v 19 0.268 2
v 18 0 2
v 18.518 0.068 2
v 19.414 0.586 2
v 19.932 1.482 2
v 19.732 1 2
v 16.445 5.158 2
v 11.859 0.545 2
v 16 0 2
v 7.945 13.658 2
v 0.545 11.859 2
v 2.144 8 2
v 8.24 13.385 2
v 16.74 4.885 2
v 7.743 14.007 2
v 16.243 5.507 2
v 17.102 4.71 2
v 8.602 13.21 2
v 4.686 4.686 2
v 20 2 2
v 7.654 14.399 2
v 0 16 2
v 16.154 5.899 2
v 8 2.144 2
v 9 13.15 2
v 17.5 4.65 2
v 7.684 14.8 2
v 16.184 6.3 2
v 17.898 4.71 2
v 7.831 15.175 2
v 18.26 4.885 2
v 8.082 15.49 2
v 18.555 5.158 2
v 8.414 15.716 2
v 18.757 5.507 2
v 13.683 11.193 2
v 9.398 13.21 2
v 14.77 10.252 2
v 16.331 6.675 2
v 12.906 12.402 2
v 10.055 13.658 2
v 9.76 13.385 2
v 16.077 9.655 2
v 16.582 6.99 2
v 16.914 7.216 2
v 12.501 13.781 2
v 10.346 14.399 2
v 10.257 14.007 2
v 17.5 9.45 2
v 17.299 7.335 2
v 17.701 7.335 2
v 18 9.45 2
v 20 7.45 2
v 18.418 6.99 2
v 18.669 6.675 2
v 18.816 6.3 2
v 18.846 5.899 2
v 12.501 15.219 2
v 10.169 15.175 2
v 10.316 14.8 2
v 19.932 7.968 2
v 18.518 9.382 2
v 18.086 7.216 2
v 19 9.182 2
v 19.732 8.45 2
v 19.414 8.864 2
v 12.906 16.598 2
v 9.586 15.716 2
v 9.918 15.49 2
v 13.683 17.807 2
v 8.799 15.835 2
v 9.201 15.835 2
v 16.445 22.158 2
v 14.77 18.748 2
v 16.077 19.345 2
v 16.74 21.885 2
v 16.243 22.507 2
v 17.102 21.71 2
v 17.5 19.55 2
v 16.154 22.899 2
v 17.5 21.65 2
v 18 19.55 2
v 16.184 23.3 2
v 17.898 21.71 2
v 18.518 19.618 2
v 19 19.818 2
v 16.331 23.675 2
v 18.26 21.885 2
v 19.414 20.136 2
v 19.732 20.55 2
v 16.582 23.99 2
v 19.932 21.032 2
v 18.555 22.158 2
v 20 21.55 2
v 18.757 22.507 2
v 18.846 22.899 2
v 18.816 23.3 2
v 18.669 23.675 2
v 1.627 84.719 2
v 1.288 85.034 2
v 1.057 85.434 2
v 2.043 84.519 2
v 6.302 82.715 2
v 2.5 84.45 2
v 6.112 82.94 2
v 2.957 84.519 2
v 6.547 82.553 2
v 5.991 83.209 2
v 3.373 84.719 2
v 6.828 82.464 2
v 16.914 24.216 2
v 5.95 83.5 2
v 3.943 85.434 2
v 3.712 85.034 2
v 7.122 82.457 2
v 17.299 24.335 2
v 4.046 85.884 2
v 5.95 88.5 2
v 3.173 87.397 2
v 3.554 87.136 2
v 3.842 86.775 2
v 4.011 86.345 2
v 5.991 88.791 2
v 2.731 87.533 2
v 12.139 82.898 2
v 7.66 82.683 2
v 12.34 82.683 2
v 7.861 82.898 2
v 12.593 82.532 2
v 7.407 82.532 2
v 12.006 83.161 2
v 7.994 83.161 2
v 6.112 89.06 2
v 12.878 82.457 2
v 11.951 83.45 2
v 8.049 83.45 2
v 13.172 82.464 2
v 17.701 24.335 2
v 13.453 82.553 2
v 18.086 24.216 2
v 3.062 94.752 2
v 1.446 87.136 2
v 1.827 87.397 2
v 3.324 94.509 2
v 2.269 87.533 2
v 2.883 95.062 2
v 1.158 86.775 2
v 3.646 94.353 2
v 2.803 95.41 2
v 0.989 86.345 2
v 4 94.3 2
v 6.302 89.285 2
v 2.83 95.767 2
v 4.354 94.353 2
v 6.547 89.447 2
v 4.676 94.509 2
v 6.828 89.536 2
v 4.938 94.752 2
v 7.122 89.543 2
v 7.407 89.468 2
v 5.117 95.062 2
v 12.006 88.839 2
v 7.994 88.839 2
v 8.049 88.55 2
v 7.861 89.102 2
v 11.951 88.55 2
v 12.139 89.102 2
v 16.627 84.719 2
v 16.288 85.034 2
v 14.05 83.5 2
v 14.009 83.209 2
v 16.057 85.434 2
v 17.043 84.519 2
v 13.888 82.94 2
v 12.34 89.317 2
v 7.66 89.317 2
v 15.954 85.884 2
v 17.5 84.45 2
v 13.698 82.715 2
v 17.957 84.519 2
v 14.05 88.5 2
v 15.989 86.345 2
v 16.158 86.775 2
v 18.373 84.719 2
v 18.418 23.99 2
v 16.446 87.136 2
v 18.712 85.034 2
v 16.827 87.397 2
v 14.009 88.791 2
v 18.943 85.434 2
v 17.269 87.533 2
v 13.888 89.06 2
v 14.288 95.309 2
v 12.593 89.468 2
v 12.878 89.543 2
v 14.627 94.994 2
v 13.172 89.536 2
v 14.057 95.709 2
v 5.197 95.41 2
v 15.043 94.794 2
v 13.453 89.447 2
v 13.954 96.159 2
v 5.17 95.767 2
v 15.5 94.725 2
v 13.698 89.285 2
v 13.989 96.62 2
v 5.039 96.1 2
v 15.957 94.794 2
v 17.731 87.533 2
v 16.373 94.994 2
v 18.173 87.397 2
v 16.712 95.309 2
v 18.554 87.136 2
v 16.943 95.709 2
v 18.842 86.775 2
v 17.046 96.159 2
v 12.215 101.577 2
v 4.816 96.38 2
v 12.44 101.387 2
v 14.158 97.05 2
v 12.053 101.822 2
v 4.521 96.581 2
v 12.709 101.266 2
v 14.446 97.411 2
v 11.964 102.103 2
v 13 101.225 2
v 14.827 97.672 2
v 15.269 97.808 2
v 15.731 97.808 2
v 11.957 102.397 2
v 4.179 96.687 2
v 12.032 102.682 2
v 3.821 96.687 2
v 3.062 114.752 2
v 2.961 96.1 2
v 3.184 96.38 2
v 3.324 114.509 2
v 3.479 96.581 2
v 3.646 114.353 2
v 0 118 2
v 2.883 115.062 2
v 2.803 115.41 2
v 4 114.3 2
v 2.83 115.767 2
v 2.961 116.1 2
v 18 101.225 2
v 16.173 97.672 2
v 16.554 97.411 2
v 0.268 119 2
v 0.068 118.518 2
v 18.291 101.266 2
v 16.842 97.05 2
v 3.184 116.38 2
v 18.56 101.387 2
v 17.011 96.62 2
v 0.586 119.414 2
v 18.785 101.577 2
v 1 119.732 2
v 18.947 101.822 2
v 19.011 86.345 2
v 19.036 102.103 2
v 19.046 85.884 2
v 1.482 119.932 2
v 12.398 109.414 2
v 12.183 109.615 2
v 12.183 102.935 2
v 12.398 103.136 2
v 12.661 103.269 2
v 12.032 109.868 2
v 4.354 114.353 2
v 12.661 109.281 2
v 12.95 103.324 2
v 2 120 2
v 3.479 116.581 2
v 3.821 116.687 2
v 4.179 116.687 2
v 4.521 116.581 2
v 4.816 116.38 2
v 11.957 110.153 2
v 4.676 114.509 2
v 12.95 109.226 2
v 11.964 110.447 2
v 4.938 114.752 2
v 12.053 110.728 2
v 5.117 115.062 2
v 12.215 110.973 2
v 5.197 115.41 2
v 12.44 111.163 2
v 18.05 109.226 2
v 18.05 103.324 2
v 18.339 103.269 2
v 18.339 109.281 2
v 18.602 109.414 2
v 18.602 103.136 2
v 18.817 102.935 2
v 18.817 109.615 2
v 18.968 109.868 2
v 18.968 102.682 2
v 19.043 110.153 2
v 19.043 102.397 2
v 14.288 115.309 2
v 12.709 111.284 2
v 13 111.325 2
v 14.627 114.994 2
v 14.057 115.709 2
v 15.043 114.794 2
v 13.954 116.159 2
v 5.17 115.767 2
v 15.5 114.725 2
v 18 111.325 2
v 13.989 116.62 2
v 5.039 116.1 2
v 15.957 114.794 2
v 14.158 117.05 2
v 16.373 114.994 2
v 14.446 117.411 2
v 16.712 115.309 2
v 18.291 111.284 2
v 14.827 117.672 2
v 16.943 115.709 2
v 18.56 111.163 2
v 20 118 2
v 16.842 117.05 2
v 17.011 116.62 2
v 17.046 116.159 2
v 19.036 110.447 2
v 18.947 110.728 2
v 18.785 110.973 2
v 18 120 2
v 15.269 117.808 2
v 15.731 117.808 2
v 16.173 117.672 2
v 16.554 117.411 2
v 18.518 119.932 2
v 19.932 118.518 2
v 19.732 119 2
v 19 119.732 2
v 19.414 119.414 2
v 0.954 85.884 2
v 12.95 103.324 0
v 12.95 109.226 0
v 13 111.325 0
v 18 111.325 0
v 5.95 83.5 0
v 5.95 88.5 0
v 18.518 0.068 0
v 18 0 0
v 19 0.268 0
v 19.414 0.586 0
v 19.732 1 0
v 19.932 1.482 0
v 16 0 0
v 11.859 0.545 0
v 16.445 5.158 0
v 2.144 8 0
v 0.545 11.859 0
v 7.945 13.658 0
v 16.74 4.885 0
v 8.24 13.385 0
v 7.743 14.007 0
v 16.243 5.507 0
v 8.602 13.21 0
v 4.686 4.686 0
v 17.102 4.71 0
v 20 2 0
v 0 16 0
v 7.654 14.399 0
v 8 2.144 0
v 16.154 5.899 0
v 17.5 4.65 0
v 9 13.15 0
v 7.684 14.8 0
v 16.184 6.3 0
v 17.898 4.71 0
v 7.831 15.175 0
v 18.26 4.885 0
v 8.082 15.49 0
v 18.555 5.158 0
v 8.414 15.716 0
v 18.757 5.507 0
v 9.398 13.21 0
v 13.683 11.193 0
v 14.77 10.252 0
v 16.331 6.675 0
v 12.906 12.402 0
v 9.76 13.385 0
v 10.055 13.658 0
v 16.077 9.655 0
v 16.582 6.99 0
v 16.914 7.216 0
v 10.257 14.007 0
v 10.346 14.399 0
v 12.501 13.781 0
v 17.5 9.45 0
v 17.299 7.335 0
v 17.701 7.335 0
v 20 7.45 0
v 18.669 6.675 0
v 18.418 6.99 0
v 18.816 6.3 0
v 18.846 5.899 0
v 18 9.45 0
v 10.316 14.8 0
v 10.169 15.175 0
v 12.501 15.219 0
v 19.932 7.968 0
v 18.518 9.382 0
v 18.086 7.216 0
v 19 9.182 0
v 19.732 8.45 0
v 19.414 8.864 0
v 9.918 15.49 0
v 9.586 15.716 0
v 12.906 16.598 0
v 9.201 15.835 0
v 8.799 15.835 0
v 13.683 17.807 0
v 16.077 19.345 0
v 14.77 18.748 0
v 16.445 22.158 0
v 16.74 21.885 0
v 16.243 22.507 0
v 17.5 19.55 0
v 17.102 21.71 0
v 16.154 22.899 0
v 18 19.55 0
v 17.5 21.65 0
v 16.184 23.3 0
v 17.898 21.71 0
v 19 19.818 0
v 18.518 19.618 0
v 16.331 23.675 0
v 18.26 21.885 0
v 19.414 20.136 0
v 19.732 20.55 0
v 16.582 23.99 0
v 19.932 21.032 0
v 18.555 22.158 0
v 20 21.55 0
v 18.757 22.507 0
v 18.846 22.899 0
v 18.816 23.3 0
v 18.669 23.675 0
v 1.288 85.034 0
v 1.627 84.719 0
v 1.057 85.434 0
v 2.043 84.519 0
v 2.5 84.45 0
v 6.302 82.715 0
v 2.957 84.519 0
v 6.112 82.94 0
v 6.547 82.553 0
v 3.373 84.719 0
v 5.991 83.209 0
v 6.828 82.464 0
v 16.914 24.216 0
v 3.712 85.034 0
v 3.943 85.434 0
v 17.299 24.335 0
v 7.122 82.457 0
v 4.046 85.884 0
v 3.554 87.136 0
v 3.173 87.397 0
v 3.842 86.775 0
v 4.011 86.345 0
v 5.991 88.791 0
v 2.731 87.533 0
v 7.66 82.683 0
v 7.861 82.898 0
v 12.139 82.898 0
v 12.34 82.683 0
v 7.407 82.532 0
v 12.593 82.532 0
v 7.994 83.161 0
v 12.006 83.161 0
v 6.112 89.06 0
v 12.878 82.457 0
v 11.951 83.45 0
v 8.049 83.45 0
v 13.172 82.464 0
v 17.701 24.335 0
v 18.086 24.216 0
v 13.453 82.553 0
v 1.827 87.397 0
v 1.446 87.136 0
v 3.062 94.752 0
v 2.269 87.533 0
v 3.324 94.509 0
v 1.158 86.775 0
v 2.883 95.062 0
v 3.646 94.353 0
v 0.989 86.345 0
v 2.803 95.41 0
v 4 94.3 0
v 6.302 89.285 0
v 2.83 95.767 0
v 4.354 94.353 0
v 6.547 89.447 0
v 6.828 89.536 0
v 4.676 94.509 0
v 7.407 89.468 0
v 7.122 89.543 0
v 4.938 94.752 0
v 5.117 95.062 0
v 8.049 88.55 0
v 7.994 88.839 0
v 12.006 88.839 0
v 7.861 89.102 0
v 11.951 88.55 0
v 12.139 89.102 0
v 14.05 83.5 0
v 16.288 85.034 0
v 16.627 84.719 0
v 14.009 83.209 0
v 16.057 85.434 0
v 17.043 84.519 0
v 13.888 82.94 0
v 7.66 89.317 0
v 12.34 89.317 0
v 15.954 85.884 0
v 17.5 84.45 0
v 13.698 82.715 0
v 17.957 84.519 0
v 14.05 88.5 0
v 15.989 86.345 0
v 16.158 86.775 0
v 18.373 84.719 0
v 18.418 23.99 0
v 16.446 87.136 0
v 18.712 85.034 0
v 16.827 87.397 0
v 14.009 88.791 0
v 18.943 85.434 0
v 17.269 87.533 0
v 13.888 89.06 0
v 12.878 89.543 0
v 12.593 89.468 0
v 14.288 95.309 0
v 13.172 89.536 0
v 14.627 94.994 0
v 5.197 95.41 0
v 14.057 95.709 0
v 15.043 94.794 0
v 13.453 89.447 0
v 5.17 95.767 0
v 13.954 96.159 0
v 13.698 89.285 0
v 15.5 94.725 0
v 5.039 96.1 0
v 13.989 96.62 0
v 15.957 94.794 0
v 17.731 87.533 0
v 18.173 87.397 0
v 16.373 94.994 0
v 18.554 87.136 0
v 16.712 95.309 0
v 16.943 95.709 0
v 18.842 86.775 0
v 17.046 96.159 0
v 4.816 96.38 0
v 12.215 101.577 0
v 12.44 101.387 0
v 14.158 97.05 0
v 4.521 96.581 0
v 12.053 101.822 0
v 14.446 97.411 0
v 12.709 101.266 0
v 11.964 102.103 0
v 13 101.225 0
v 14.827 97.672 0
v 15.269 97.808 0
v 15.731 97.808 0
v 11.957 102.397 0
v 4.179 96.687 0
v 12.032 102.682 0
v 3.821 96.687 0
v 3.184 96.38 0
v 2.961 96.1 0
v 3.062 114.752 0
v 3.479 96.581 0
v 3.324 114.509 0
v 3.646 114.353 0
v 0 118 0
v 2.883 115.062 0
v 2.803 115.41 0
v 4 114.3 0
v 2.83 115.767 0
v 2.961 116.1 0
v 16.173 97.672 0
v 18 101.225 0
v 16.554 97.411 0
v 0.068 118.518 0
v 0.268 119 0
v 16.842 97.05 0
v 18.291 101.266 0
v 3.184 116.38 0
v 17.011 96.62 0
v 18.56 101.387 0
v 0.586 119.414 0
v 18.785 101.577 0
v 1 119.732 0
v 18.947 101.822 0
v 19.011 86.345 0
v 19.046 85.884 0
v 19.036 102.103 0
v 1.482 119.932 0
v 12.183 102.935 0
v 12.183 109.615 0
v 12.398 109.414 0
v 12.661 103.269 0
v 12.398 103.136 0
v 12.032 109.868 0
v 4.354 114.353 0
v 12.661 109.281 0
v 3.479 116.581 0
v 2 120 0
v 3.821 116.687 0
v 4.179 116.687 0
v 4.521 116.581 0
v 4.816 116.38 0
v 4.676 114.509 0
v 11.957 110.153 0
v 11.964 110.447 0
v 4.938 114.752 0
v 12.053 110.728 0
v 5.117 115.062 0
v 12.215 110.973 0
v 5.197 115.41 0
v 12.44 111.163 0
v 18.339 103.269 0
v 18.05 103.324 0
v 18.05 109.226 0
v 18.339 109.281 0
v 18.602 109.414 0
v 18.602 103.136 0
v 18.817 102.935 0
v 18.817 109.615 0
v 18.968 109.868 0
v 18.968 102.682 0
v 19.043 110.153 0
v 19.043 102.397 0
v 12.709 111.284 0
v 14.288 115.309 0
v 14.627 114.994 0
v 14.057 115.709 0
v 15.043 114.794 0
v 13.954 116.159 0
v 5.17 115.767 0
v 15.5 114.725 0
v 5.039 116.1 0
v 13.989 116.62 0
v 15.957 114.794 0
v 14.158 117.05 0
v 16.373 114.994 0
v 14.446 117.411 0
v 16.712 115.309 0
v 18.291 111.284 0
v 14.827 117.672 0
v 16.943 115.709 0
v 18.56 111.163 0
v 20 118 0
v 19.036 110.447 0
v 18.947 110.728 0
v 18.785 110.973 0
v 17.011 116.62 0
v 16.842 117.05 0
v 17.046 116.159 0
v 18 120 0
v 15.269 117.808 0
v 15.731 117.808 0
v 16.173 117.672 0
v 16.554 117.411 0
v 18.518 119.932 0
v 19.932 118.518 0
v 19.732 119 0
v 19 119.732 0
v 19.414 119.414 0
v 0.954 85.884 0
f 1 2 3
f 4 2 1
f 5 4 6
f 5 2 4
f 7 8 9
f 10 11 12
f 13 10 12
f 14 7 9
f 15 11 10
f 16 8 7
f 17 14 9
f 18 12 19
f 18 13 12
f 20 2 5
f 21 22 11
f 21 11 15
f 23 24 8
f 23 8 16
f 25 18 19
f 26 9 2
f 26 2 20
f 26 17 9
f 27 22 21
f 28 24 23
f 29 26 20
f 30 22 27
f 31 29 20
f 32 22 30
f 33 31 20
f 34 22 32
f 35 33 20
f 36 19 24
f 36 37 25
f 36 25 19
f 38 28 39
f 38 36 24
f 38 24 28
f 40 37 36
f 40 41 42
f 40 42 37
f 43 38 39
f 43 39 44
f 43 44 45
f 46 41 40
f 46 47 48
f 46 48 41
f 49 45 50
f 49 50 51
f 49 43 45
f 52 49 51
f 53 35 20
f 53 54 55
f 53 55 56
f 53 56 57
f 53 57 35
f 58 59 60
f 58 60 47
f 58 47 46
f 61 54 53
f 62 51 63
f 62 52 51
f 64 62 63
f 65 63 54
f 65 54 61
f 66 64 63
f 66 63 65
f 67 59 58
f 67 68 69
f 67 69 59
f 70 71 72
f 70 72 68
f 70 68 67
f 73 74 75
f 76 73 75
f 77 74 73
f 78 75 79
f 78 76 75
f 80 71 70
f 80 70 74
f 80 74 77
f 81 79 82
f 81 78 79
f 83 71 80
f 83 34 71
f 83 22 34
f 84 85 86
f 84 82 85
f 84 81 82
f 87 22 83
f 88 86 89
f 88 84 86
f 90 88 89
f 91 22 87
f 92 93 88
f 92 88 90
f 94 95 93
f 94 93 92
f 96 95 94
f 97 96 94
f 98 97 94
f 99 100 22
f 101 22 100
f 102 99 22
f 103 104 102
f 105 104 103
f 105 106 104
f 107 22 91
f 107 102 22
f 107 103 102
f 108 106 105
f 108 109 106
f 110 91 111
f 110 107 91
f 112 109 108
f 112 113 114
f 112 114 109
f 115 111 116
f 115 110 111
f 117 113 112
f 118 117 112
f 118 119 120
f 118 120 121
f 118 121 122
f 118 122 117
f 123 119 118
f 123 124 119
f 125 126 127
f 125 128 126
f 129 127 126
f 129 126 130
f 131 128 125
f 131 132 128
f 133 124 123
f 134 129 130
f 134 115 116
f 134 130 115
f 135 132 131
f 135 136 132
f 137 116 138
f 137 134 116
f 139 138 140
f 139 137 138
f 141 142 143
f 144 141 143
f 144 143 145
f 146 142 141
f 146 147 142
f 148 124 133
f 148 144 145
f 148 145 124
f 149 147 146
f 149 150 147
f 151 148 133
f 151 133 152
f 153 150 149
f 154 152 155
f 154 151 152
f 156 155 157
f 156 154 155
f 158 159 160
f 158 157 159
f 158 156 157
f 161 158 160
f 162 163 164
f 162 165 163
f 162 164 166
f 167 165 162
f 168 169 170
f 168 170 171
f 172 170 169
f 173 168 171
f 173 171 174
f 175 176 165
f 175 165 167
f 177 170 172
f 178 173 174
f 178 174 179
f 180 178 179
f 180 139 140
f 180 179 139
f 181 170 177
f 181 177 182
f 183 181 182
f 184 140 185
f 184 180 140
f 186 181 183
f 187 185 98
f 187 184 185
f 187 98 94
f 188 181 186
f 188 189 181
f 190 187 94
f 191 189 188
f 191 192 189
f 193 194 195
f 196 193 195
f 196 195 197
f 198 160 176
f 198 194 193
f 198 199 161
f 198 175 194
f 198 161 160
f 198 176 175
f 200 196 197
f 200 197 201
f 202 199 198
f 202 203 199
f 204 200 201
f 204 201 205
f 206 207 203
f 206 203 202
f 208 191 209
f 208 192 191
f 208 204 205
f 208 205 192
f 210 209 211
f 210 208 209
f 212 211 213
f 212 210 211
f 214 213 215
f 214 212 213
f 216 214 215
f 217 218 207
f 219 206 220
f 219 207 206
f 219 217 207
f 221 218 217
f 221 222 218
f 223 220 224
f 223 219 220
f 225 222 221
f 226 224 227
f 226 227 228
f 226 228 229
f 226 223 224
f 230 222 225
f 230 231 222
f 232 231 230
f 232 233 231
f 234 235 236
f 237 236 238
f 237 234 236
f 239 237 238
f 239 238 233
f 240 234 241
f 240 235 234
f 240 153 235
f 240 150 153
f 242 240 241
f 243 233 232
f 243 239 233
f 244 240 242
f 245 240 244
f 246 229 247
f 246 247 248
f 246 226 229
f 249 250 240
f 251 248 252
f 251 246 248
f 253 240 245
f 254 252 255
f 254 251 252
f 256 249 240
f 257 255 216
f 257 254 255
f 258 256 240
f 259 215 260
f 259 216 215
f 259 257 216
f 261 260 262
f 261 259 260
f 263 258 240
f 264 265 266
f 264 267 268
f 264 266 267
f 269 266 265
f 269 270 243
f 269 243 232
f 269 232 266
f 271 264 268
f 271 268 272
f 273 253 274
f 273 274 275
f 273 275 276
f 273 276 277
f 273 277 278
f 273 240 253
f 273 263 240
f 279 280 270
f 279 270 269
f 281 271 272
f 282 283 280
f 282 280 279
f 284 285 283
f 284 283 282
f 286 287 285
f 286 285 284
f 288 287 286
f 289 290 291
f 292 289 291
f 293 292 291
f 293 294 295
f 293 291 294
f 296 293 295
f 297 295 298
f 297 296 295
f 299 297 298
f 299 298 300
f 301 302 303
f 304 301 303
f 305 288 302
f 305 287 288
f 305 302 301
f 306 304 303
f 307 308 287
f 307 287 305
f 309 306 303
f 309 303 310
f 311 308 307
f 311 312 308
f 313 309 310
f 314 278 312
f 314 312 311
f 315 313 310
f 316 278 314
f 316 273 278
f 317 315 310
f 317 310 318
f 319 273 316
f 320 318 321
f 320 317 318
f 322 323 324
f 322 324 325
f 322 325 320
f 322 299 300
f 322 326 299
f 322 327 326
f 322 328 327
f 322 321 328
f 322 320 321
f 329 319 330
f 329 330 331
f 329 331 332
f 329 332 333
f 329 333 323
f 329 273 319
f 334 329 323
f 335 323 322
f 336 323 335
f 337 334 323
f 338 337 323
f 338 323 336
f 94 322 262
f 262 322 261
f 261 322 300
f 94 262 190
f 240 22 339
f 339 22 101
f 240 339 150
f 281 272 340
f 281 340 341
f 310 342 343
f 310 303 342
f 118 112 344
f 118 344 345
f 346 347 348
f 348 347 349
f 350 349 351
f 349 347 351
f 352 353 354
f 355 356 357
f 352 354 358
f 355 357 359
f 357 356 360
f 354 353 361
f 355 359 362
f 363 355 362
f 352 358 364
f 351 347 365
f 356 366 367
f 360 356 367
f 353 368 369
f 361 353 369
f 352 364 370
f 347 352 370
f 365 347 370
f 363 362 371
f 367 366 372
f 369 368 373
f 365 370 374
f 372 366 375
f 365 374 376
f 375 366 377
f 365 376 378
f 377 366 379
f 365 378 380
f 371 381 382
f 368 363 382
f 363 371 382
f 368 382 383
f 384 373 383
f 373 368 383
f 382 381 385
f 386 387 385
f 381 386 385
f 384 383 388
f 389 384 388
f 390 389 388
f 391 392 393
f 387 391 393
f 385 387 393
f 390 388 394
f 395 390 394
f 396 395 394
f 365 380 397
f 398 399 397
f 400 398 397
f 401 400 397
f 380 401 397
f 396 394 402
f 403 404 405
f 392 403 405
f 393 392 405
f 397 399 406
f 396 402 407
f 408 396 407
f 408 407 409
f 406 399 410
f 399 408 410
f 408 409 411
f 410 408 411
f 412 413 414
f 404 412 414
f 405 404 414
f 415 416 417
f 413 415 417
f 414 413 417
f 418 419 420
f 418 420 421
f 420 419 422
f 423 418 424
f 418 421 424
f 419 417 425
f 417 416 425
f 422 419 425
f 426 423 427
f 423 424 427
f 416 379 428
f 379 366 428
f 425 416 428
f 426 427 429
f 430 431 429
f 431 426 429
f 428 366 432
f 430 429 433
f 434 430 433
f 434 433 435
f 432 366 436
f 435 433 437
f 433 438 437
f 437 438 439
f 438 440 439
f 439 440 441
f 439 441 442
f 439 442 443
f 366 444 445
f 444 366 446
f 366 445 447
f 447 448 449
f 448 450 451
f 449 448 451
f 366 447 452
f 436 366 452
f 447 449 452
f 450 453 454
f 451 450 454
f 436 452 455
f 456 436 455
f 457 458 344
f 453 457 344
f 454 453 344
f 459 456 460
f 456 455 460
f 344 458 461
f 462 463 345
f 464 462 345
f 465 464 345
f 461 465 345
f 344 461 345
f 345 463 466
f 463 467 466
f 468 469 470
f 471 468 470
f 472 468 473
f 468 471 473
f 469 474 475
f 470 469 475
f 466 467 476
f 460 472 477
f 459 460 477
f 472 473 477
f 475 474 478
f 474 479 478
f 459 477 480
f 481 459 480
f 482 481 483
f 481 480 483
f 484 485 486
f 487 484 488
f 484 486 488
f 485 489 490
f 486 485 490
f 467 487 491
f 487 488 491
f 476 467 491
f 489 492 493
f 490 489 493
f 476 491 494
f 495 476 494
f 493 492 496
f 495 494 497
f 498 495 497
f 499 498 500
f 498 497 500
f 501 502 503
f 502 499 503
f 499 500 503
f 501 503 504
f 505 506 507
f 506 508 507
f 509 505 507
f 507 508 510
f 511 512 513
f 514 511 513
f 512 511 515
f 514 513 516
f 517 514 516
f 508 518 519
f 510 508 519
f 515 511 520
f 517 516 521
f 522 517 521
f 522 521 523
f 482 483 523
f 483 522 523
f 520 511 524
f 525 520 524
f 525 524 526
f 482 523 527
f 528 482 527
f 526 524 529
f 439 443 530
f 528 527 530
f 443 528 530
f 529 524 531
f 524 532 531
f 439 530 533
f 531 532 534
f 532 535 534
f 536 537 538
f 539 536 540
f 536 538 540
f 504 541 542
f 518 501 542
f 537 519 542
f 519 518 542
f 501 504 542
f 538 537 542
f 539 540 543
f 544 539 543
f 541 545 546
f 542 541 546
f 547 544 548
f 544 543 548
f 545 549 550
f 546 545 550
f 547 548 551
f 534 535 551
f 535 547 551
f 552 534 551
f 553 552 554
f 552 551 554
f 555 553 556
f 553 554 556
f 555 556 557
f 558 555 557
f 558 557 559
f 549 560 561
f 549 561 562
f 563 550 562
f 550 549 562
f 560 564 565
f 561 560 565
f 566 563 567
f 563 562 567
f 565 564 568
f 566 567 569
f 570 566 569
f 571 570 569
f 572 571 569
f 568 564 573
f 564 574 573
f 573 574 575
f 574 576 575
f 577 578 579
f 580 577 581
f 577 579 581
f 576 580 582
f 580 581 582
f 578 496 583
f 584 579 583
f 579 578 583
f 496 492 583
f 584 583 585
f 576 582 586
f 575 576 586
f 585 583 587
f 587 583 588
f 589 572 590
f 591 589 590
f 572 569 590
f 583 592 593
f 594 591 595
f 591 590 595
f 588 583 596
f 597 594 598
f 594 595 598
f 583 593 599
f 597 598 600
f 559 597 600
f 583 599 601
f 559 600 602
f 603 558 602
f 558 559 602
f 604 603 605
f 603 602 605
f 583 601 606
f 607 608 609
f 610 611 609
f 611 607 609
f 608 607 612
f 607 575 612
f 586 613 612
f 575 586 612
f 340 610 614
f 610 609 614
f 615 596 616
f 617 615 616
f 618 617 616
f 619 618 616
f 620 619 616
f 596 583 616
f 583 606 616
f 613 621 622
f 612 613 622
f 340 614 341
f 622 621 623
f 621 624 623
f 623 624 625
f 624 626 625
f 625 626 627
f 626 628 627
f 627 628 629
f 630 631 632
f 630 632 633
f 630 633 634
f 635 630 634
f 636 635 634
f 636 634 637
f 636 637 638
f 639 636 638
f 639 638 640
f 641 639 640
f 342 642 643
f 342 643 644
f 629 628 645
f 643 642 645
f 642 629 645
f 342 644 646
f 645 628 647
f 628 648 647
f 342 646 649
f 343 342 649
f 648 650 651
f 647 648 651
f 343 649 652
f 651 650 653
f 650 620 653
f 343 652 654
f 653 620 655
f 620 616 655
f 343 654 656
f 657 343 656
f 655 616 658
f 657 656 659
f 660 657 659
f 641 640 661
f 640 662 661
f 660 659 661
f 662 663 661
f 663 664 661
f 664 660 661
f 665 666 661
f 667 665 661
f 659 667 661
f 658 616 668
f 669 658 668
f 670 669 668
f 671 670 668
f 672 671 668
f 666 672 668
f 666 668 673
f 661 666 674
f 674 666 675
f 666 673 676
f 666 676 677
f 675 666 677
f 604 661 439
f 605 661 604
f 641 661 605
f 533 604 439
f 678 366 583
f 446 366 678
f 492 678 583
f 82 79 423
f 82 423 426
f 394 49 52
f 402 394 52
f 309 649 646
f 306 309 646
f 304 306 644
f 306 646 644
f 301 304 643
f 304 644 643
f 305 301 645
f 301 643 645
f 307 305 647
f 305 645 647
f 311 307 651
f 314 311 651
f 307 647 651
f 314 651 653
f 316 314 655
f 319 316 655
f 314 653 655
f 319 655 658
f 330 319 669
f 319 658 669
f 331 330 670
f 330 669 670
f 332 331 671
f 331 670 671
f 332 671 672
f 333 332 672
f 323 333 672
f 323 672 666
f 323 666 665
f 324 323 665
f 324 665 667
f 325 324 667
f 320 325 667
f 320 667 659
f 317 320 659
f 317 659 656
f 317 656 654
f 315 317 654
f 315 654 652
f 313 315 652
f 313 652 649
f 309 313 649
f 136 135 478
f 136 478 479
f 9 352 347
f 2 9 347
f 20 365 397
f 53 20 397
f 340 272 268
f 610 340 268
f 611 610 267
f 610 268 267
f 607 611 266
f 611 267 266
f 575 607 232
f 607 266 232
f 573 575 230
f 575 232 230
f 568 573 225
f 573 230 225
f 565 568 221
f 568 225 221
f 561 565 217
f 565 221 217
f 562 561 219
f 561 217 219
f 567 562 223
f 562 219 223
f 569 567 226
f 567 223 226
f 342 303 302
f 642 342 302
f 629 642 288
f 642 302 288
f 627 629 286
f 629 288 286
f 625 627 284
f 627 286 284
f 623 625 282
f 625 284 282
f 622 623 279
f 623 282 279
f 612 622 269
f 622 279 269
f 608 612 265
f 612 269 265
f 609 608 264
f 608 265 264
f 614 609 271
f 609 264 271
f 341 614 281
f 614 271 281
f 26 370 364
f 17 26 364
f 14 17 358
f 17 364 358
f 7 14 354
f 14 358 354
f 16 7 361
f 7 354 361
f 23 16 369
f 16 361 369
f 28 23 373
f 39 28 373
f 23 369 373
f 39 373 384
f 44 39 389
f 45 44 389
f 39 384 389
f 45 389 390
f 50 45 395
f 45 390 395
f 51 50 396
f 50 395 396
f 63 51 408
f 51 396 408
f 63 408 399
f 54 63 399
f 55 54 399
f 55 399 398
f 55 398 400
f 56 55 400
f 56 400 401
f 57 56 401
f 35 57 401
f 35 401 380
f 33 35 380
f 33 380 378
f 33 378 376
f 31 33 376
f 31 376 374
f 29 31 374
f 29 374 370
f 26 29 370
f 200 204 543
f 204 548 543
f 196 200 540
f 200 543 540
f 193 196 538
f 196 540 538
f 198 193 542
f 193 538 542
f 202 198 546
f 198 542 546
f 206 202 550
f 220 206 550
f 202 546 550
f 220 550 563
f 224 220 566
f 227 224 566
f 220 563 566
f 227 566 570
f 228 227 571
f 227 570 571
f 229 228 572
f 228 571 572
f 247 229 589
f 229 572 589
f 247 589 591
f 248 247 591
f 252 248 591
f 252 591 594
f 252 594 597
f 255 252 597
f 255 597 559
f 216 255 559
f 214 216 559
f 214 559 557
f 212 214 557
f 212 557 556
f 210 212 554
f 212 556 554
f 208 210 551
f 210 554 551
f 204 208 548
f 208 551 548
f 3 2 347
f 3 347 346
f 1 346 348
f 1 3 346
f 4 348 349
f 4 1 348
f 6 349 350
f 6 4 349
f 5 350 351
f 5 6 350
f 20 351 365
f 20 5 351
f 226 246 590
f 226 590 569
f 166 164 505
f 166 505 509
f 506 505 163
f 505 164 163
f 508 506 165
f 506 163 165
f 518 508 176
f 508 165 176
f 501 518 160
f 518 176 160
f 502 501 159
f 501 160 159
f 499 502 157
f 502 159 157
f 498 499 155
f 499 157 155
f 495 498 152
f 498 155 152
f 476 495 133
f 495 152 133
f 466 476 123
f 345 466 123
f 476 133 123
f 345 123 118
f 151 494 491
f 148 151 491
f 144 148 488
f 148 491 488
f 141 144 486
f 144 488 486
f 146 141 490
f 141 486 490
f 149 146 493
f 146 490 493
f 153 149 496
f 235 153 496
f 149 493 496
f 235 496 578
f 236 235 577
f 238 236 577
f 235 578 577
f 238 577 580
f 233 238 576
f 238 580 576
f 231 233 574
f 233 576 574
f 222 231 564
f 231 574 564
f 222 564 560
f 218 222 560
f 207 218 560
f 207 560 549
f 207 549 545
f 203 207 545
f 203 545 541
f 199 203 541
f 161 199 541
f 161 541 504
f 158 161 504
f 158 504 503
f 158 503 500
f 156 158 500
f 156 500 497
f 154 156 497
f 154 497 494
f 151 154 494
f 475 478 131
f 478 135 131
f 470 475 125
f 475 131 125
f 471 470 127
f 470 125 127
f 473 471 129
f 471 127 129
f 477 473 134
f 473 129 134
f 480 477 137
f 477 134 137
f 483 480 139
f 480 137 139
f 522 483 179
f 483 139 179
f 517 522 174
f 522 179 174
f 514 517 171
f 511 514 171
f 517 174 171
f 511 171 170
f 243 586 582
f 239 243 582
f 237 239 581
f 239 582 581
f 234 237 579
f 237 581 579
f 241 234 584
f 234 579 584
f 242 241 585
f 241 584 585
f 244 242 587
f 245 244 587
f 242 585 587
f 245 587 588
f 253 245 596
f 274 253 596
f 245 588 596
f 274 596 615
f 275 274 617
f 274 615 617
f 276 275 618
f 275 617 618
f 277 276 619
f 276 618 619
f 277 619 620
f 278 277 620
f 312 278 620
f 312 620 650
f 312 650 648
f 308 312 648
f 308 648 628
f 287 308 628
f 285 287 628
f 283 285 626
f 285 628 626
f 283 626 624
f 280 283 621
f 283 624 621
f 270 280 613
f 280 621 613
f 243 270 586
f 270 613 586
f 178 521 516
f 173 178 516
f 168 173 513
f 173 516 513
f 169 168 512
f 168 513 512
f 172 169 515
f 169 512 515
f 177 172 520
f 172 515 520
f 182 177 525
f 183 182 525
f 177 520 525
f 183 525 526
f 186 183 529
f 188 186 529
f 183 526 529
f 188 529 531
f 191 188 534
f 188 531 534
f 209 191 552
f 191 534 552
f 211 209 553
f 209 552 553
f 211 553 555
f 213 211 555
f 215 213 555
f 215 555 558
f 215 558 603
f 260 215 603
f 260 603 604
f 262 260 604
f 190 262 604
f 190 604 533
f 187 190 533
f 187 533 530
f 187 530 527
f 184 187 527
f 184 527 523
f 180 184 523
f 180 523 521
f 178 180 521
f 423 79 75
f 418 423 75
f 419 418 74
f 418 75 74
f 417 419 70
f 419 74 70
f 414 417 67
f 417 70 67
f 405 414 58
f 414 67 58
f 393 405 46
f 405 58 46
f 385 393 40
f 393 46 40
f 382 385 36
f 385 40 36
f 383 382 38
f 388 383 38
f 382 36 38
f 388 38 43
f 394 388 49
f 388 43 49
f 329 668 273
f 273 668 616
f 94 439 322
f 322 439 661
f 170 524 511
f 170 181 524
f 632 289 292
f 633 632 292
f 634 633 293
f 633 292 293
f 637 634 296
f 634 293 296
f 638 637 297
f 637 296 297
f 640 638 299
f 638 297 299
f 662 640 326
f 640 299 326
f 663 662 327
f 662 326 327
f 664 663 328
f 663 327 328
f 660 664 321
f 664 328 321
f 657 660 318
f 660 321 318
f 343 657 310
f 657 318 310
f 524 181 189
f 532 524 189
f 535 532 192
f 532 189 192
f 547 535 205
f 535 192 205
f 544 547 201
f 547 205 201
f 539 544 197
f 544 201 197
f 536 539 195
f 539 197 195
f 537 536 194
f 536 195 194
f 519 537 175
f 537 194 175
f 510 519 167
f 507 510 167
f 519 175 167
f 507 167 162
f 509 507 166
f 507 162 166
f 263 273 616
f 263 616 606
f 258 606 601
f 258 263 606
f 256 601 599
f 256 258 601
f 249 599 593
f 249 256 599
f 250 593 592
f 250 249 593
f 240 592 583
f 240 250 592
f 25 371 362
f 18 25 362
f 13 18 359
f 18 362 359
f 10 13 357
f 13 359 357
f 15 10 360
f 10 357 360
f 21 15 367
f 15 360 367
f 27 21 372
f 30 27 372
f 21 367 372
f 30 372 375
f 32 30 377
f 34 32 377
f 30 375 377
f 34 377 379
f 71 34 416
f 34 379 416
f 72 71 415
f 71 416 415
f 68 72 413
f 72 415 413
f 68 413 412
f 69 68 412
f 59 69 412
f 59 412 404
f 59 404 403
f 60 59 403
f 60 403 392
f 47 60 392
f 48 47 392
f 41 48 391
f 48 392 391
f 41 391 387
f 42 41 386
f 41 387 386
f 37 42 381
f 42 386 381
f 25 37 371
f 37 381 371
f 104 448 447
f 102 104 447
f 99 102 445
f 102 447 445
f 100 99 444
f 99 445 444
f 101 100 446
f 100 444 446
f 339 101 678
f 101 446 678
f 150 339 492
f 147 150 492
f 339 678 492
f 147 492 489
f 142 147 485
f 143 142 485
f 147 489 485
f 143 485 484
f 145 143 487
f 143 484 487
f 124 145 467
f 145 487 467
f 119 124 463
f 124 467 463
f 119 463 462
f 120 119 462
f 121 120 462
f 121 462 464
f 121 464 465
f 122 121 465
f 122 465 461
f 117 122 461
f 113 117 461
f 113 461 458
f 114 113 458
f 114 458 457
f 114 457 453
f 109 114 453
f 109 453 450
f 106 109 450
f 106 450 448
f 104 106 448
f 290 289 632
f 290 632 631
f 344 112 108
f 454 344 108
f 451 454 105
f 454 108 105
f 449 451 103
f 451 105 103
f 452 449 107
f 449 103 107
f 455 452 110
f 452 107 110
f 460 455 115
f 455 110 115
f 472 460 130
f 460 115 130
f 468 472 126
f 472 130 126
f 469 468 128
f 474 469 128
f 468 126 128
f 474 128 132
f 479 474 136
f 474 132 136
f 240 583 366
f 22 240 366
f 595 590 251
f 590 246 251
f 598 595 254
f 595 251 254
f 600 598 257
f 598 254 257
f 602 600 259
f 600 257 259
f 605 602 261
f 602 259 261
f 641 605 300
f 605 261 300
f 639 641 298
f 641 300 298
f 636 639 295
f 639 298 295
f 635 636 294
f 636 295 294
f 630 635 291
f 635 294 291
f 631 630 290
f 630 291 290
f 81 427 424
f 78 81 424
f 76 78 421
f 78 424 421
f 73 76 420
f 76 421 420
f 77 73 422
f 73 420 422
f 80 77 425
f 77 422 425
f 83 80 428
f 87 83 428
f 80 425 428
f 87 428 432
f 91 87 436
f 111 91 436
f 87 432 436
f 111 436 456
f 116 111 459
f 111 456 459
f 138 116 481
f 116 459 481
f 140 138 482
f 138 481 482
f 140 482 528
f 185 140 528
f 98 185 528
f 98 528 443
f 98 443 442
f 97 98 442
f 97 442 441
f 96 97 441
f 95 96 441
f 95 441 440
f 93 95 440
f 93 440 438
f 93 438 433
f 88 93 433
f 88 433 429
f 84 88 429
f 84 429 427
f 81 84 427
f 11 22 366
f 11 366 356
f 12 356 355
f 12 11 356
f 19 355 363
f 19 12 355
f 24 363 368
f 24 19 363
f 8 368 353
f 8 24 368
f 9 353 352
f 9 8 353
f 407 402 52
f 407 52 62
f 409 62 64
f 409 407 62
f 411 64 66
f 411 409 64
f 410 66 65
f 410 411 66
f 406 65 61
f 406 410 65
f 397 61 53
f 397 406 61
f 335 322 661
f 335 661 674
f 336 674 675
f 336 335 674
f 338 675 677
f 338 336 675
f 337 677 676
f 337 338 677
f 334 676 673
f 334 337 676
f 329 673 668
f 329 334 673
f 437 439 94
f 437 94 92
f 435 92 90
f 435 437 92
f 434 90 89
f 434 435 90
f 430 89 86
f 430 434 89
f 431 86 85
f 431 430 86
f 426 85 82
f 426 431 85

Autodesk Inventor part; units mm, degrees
ref_plane "YZ Plane" through (0, 0, 0) normal (1, 0, 0) x (0, 1, 0)
ref_plane "XZ Plane" through (0, 0, 0) normal (0, 1, 0) x (-1, 0, 0)
ref_plane "XY Plane" through (0, 0, 0) normal (0, 0, 1) x (1, 0, 0)
sketch "スケッチ1" plane through (0, 0, 0) normal (0, 0, 1) x (1, 0, 0)
  line L0 (0, 0) -> (20, 0)
  line L1 (20, 0) -> (20, 120)
  line L2 (20, 120) -> (0, 120)
  line L3 (0, 120) -> (0, 0)
  dimension "d0" = 120
  dimension "d1" = 20
extrude "押し出し1" add sketch "スケッチ1" along normal blind 2
sketch "スケッチ2" plane through (0, 0, 2) normal (0, 0, 1) x (1, 0, 0)
  line L0 (0, 0) -> (20, 0) projected
  line L1 (17.5, 0) -> (17.5, 120.1891) construction
  line L2 (20, 0) -> (20, 120) projected
  arc A0 (17.5, 19.55) -> (17.5, 9.45) centre (17.5, 14.5) ccw
  line L3 (17.5, 19.55) -> (20, 19.55)
  line L4 (17.5, 9.45) -> (20, 9.45)
  dimension "d4" = 2.5
  dimension "d5" = 14.5
  dimension "d6" = 10.1
extrude "押し出し2" cut sketch "スケッチ2" against normal up to surface (2 mm away)
sketch "スケッチ3" plane through (0, 0, 2) normal (0, 0, 1) x (1, 0, 0)
  arc A0 (17.5, 19.55) -> (17.5, 9.45) centre (17.5, 14.5) ccw projected
  circle A1 centre (17.5, 14.5) radius 8.5 construction
  point P0 (0, 0)
  point P1 (9, 14.5)
  point P2 (17.5, 23)
  point P3 (17.5, 6)
  dimension "d9" = 17
hole "穴1" at (9, 14.5, 2) at (17.5, 23, 2) at (17.5, 6, 2) direction (0, 0, -1) diameter 2.7 end through all
sketch "スケッチ4" plane through (0, 0, 2) normal (0, 0, 1) x (1, 0, 0)
  line L0 (20, 120) -> (0, 120) projected
  line L1 (4, 120) -> (4, 0) construction
  line L2 (0, 120) -> (0, 0) projected
  point P0 (4, 115.5)
  point P1 (4, 95.5)
  dimension "d17" = 4
  dimension "d18" = 4.5
  dimension "d19" = 20
hole "穴2" at (4, 115.5, 2) at (4, 95.5, 2) direction (0, 0, -1) diameter 2.4 end through all
sketch "スケッチ5" plane through (0, 0, 2) normal (0, 0, 1) x (1, 0, 0)
  line L0 (13, 111.275) -> (18, 111.275)
  line L1 (18, 111.275) -> (18, 101.275)
  line L2 (18, 101.275) -> (13, 101.275)
  line L3 (13, 101.275) -> (13, 111.275)
  line L4 (20, 19.55) -> (20, 120) projected
  circle A0 centre (18, 110.275) radius 1
  circle A1 centre (13, 110.275) radius 1
  circle A2 centre (13, 102.275) radius 1
  circle A3 centre (18, 102.275) radius 1
  point P0 (0, 0)
  dimension "d27" = 5
  dimension "d28" = 10
  dimension "d29" = 2
  dimension "d30" = 2
  dimension "d31" = 2
  dimension "d32" = 2
  dimension "d33" = 2
extrude "押し出し3" cut sketch "スケッチ5" against normal up to surface (2 mm away)
sketch "スケッチ6" plane through (0, 0, 2) normal (0, 0, 1) x (1, 0, 0)
  line L0 (15.5, 119.9651) -> (15.5, 0) construction
  line L1 (0, 0) -> (20, 0) projected
  line L2 (18, 109.275) -> (18, 103.275) projected
  line L3 (18, 106.275) -> (13, 106.275) construction
  line L4 (13, 103.275) -> (13, 109.275) projected
  point P0 (15.5, 116.275)
  point P1 (15.5, 96.275)
  dimension "d37" = 2.5
  dimension "d38" = 20
hole "穴3" at (15.5, 116.275, 2) at (15.5, 96.275, 2) direction (0, 0, -1) diameter 3.1 end through all
sketch "スケッチ7" plane through (0, 0, 2) normal (0, 0, 1) x (1, 0, 0)
  line L0 (20, 120) -> (0, 120) projected
  line L1 (10, 120) -> (10, 0) construction
  line L2 (0, 0) -> (20, 0) projected
  line L3 (8, 88.5) -> (12, 88.5)
  line L4 (14, 88.5) -> (14, 83.5)
  line L5 (12, 83.5) -> (8, 83.5)
  line L6 (6, 83.5) -> (6, 88.5)
  arc A0 (8, 88.5) -> (6, 88.5) centre (7, 88.5) ccw
  line L7 (6, 86) -> (14, 86) construction
  arc A1 (6, 83.5) -> (8, 83.5) centre (7, 83.5) ccw
  arc A2 (14, 88.5) -> (12, 88.5) centre (13, 88.5) ccw
  arc A3 (12, 83.5) -> (14, 83.5) centre (13, 83.5) ccw
  dimension "d48" = 8
  dimension "d49" = 5
  dimension "d50" = 2
  dimension "d64" = 34
extrude "押し出し5" cut sketch "スケッチ7" against normal through all
sketch "スケッチ9" plane through (0, 0, 2) normal (0, 0, 1) x (1, 0, 0)
  line L0 (0, 86) -> (19.9715, 86) construction
  line L1 (8, 88.5) -> (12, 88.5) projected
  line L2 (10, 88.5) -> (10, 71.9666) construction
  point P0 (0, 0)
  point P1 (2.5, 86)
  point P2 (17.5, 86)
  dimension "d55" = 2.5
  dimension "d56" = 15
hole "穴4" at (2.5, 86, 2) at (17.5, 86, 2) direction (0, 0, -1) diameter 3.1 end through all
fillet "フィレット3" radius 2 5 edges at (20, 0, 1) (20, 9.45, 1) (20, 19.55, 1) (20, 120, 1) (0, 120, 1)
fillet "フィレット4" radius 16 1 edges at (0, 0, 1)
thicken "厚み1" operation cut thickness 0.05 both sides no extend neighbours no toward (-1, 0, 0) faces at (6, 86.8333, 1.3333) (7.7994, 89.1007, 0.6667) (10.6667, 88.5, 0.6667) (12.1548, 89.0345, 0.6667) (6.2006, 82.8993, 0.6667) (9.3333, 83.5, 1.3333) (12.08, 83.108, 0.6667) (14, 85.1667, 1.3333)
thicken "厚み2" operation cut thickness 0.05 both sides no extend neighbours no toward (1, 0, 0) faces at (18, 107.275, 1.3333) (18.866, 110.775, 0.6667) (18.9035, 101.8464, 1.3333) (16.3333, 101.275, 1.3333) (12.0008, 102.2348, 0.6667) (13, 105.275, 1.3333) (12.134, 109.775, 0.6667) (14.6667, 111.275, 1.3333)
equation "\"d37\" = 0.5 * d27"
equation "\"d55\" = 0.5 * d49"
properties material "アルミニウム 2014-T4"
